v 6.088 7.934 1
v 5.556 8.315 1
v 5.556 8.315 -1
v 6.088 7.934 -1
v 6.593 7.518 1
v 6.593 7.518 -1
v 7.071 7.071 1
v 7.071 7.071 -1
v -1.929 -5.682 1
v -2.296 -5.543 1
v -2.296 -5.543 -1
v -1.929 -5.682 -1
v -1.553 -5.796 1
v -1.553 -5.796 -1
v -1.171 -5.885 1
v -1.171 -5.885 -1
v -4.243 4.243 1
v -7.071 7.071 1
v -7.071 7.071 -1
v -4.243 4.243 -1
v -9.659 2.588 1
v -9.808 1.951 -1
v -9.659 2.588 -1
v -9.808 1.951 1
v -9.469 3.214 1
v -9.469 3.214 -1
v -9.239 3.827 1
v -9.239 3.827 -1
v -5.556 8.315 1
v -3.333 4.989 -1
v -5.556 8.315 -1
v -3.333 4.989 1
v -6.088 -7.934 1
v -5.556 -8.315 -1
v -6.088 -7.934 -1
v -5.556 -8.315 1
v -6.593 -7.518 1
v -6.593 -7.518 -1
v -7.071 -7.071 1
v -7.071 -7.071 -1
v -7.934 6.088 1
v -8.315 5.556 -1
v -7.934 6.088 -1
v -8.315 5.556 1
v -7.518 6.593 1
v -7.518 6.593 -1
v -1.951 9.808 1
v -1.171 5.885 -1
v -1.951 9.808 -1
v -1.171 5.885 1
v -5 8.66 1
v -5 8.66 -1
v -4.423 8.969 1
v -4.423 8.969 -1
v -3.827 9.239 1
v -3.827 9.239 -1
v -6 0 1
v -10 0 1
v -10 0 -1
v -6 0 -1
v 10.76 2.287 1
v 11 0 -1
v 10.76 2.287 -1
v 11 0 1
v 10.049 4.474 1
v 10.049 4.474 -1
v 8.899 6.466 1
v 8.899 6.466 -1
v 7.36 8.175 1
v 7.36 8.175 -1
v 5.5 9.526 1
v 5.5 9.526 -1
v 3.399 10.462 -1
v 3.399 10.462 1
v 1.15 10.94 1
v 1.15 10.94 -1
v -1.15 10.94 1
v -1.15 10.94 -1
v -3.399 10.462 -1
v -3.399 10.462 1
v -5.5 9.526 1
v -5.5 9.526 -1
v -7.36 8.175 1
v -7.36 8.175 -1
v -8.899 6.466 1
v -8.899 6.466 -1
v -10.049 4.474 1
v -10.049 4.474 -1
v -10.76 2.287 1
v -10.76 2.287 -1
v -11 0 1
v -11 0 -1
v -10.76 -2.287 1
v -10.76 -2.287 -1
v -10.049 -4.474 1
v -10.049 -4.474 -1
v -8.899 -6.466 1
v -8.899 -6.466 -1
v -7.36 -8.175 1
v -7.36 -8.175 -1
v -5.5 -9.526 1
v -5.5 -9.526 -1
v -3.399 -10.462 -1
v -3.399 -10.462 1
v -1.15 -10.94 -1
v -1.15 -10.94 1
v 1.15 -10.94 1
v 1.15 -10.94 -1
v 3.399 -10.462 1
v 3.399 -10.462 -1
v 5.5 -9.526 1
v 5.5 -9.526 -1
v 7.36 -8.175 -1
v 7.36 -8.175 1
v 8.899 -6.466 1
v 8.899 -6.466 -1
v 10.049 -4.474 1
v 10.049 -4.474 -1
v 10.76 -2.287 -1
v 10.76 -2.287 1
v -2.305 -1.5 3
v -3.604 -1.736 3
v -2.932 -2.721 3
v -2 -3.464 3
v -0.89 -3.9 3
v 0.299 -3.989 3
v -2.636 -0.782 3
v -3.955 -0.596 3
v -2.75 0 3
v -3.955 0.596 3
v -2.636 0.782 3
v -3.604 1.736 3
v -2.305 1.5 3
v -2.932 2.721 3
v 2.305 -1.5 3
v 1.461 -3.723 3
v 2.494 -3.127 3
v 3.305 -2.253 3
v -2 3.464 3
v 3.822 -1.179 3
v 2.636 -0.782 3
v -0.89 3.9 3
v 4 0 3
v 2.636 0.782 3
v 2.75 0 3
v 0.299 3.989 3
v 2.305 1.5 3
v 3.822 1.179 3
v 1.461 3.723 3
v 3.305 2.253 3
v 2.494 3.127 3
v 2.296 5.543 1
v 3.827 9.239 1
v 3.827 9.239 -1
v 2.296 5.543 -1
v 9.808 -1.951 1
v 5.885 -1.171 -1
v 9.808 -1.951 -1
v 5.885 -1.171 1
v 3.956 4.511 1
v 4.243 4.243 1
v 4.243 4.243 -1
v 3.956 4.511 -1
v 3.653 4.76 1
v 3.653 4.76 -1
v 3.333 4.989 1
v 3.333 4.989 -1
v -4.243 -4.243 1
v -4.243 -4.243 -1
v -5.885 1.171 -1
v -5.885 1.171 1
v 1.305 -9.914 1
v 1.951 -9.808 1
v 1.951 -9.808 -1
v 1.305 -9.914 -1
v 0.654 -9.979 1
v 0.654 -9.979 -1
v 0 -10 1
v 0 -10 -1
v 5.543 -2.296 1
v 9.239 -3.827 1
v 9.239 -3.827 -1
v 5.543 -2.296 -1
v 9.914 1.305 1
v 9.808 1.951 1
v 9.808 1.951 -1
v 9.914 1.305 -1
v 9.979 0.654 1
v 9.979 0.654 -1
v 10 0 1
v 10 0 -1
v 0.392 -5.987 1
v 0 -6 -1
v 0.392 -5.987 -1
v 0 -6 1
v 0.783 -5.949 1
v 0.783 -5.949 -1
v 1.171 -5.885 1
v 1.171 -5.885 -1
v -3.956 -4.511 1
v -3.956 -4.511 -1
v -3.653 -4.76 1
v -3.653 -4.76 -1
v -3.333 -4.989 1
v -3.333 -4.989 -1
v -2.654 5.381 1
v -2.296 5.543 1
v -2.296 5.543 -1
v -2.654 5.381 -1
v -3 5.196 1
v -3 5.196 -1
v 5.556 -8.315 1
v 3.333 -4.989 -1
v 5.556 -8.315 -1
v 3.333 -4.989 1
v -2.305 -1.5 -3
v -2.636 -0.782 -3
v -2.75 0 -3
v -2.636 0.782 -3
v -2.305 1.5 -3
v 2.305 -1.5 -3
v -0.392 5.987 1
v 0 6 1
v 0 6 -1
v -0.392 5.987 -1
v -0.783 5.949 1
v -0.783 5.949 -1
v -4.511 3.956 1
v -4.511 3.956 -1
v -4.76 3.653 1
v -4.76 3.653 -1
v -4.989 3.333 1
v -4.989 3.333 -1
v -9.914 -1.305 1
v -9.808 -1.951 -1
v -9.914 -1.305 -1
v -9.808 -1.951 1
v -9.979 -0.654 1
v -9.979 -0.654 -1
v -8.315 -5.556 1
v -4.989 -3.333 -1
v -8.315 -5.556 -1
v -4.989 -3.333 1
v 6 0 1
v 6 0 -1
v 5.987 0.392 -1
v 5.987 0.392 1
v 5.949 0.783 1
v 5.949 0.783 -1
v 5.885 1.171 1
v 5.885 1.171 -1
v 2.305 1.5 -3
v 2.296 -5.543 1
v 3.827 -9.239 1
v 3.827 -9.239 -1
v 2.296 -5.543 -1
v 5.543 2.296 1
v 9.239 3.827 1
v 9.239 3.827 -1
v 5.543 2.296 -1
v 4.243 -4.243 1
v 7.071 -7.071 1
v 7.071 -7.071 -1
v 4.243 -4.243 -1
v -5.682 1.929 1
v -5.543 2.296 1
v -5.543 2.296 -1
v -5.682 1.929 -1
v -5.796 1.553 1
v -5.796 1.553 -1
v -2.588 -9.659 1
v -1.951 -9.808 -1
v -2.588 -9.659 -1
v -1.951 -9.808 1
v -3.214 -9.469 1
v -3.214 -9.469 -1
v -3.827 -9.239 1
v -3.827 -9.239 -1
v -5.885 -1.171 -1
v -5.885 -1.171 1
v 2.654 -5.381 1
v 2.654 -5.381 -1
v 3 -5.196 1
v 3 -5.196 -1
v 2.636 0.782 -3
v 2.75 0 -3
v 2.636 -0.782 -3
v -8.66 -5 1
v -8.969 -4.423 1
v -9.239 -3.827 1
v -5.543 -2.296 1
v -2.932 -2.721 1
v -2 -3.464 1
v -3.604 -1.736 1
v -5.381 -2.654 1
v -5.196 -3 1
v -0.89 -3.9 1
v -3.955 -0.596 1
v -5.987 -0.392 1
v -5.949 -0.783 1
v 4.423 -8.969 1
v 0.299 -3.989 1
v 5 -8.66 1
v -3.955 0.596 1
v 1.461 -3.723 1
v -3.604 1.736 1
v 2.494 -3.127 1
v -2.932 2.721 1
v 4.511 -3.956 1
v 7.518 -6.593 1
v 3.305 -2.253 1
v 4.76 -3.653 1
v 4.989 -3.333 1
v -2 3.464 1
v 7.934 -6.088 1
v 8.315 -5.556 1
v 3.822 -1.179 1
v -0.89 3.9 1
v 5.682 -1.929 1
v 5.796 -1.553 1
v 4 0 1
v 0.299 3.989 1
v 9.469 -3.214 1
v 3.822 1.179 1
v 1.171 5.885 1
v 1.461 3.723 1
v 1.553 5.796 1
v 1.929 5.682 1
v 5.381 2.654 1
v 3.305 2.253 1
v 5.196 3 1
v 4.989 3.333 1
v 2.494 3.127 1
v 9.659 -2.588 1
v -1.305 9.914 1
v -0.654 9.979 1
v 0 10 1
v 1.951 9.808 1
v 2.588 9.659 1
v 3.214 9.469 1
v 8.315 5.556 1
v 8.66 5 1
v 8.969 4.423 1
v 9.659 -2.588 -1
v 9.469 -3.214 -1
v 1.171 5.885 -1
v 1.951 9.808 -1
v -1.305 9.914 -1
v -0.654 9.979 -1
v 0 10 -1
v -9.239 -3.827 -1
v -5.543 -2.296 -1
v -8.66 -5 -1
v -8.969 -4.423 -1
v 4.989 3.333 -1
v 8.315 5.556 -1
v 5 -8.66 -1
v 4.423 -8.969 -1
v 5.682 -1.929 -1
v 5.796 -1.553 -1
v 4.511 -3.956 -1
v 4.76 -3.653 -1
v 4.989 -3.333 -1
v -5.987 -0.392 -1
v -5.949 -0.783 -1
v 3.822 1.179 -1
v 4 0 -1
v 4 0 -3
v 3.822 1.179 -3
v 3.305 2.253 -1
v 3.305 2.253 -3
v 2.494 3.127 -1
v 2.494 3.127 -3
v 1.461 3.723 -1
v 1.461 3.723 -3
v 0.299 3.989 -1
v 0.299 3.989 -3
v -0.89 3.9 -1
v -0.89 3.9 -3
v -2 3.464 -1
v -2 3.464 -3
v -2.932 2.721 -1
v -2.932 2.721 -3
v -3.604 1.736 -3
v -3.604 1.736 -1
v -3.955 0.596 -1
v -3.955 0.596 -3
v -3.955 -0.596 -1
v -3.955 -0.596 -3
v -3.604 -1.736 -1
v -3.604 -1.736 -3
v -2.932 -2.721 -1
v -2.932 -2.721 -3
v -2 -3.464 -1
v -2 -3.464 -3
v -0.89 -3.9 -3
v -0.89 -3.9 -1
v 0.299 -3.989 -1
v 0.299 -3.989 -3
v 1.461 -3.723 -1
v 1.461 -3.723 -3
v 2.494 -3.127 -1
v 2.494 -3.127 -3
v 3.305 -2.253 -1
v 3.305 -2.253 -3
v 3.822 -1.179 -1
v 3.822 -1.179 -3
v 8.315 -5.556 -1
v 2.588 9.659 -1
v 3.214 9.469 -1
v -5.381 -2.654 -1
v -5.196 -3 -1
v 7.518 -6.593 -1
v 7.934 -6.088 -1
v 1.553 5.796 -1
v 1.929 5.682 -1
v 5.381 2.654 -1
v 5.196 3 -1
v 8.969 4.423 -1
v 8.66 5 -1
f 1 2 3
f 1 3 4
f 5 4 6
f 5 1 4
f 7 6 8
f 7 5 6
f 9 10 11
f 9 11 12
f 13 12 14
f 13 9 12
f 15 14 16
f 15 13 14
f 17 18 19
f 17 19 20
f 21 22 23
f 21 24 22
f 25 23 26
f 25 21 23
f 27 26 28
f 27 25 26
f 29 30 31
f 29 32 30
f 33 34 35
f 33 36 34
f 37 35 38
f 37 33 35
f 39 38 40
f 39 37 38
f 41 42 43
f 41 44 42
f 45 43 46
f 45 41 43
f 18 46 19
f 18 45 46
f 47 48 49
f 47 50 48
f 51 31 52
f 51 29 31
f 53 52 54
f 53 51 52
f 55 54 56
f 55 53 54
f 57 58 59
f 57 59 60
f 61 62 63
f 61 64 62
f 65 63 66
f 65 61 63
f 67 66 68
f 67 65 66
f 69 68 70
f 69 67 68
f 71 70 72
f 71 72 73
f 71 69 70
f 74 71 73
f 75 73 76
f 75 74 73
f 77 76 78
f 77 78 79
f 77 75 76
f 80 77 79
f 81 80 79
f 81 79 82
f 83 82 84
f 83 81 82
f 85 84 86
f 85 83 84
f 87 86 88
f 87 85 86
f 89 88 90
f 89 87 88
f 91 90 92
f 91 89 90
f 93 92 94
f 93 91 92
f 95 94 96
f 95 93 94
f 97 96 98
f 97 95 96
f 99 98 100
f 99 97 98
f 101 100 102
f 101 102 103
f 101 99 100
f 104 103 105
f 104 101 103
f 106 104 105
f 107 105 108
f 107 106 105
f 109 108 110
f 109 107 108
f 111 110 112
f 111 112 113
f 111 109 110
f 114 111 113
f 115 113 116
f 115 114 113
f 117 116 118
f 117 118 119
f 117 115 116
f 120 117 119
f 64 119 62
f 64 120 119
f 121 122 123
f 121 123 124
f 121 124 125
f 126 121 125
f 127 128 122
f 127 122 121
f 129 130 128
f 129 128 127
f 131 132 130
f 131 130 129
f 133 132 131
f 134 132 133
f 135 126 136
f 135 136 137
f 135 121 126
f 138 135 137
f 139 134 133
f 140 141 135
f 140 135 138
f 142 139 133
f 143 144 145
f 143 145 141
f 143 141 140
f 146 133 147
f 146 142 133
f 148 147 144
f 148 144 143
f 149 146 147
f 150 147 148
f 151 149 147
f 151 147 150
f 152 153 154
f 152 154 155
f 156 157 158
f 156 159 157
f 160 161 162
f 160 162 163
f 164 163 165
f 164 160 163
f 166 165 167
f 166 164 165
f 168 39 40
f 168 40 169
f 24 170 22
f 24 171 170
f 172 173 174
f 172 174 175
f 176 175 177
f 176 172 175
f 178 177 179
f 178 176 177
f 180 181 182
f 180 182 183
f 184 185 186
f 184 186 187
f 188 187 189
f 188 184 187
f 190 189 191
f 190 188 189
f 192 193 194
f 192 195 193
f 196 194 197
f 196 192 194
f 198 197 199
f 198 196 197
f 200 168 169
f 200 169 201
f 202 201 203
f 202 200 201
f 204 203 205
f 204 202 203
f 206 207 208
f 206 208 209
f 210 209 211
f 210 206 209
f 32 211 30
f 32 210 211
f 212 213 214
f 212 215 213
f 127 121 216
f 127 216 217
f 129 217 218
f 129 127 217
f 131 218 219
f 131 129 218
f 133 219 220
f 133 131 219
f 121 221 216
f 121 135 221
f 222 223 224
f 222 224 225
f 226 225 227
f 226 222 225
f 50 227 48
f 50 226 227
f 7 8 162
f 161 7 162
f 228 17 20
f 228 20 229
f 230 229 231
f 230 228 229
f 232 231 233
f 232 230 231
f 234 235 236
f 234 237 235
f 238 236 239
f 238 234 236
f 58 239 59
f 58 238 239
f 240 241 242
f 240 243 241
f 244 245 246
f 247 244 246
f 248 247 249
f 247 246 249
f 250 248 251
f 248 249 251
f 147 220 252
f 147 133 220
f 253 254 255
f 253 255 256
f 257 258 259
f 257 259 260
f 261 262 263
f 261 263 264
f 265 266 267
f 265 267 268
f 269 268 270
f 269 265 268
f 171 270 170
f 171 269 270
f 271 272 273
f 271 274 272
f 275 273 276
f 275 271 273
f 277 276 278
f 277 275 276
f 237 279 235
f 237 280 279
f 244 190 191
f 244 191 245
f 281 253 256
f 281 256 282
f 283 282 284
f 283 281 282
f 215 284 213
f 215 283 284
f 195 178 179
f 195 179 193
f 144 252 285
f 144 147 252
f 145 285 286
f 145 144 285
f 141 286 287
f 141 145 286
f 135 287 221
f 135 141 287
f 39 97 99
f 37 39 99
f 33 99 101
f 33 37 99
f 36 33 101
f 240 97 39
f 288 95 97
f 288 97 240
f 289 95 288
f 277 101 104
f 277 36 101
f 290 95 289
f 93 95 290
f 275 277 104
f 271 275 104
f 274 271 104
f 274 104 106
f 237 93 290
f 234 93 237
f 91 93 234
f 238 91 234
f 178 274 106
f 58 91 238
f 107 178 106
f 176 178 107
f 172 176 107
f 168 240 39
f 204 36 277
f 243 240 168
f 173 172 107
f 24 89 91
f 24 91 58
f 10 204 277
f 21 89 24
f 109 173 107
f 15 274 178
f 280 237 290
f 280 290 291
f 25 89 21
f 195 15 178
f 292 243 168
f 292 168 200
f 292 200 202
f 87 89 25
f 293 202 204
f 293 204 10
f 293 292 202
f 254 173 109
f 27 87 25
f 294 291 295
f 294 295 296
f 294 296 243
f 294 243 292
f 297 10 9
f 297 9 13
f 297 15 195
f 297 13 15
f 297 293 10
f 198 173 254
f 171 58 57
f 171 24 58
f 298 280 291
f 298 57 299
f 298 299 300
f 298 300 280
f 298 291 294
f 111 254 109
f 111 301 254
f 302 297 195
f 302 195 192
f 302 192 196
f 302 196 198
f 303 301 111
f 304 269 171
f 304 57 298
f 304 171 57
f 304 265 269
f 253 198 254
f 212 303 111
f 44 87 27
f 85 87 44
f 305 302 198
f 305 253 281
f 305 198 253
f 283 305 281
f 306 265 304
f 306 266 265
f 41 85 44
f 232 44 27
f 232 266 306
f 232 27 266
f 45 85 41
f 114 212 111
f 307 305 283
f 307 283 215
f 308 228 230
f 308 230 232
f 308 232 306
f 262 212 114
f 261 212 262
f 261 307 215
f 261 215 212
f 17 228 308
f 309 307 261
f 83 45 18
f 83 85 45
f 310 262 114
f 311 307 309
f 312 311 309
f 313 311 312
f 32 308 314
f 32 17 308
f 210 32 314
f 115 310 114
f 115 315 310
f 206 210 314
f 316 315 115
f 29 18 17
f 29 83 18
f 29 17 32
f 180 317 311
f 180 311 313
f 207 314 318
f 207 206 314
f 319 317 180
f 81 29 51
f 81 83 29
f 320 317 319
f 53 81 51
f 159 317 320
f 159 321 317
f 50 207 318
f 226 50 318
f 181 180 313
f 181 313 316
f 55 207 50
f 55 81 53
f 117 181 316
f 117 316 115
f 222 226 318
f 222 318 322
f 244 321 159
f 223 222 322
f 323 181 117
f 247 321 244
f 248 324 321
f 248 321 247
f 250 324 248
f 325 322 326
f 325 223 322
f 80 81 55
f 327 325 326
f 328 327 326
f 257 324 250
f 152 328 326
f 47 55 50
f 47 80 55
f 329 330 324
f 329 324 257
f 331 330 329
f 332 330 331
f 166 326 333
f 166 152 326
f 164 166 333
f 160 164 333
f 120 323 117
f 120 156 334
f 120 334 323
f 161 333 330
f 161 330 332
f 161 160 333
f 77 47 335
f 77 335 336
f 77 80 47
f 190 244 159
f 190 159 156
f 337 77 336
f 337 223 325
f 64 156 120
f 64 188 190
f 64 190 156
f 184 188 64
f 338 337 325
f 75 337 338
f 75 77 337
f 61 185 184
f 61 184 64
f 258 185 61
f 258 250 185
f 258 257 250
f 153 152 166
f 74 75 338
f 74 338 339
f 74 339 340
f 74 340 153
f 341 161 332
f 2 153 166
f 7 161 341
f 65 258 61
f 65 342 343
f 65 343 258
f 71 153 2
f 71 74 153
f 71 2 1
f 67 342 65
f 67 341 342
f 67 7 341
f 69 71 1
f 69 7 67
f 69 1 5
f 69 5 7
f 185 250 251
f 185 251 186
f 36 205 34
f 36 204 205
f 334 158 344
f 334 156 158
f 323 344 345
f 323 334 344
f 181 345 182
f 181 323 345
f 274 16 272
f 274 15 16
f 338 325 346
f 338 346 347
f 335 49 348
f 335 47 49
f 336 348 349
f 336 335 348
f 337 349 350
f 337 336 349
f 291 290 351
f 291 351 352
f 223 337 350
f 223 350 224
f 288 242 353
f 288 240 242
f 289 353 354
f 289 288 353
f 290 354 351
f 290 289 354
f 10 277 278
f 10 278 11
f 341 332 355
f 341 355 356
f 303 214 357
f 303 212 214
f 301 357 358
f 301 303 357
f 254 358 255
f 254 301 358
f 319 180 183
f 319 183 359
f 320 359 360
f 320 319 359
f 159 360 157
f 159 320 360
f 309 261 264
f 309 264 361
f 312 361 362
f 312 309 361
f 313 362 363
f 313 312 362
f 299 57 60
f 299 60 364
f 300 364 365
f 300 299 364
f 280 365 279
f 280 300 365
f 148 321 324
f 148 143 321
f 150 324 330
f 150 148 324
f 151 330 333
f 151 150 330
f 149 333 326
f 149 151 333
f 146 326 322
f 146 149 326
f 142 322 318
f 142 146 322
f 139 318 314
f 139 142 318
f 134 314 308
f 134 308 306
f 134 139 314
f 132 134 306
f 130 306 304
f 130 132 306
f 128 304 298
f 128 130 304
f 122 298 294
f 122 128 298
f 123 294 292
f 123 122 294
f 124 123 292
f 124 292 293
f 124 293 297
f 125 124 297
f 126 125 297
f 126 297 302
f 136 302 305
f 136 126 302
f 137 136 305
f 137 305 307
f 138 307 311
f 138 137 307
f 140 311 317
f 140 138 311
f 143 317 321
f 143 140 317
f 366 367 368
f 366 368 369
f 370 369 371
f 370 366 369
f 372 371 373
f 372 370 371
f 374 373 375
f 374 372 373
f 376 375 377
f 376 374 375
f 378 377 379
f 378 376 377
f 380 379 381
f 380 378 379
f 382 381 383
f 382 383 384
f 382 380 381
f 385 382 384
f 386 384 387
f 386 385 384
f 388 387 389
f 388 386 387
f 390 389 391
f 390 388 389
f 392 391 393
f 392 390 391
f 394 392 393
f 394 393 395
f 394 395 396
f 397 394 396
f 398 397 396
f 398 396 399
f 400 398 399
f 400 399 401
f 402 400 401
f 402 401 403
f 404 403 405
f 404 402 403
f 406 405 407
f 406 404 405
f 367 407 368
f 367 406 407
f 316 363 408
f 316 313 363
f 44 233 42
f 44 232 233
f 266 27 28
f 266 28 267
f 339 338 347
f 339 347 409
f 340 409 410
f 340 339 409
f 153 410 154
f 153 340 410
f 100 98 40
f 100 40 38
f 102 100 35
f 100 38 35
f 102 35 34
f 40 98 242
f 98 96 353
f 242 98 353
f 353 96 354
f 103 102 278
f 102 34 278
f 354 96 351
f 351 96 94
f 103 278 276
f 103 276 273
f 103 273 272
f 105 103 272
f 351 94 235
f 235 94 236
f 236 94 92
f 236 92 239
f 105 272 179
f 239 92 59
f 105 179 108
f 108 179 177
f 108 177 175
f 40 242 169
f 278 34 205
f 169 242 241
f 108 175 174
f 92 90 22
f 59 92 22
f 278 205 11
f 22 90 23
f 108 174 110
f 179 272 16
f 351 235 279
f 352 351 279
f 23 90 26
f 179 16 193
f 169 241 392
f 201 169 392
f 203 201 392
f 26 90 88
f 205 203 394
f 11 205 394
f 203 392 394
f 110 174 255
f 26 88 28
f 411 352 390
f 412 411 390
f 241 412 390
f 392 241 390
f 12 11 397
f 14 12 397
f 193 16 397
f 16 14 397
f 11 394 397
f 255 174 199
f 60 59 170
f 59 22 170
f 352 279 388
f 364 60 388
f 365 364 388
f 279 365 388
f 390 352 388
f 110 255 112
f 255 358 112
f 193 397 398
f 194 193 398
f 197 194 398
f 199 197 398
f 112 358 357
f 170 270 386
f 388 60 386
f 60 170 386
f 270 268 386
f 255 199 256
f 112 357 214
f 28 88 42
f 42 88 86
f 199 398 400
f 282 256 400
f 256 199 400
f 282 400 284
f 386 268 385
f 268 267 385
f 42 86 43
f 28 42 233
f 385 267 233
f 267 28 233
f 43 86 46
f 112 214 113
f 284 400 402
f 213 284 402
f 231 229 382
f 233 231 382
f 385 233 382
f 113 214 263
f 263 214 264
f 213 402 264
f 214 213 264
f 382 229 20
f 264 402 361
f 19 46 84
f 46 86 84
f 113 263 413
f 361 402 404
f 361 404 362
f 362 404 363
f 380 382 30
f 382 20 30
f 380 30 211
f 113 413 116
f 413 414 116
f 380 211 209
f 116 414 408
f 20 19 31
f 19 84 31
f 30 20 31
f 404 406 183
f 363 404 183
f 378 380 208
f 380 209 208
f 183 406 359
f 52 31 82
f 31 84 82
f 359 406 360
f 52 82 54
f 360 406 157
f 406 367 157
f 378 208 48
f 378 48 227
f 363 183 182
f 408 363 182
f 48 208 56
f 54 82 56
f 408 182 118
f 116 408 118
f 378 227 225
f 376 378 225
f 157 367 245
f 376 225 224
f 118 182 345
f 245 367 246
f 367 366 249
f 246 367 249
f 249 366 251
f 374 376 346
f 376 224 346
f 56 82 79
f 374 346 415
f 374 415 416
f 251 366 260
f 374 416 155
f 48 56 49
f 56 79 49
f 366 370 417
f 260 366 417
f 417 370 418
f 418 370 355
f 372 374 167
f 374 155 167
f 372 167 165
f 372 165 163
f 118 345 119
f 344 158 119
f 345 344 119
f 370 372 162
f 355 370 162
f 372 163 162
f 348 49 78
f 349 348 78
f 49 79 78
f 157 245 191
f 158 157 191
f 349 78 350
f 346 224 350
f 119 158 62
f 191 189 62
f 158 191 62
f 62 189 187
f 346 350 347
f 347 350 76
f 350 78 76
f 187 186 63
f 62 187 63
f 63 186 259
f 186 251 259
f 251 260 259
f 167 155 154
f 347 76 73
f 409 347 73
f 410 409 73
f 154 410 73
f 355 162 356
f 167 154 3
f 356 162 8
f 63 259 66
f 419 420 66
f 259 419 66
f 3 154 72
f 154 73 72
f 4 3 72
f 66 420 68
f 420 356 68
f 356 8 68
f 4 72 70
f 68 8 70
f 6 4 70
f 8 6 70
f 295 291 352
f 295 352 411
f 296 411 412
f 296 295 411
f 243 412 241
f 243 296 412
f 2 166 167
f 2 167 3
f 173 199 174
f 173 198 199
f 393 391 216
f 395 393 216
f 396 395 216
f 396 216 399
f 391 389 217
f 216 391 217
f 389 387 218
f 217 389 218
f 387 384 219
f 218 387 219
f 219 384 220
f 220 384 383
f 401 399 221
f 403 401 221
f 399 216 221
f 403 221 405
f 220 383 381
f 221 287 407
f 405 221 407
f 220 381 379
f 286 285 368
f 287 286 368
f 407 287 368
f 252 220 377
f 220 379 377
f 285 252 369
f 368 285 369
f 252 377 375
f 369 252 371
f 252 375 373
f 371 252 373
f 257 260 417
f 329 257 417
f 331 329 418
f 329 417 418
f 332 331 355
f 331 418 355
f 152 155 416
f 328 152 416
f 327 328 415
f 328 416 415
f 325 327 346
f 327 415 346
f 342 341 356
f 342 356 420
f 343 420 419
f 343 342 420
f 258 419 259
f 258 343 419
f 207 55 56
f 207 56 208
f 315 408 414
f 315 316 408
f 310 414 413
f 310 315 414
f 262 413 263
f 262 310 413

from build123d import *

# Parameters (mm, degrees)
F0_R     = 4
F1_DEPTH = 3
F0_R_2   = 11
F2_DEPTH = 1


with BuildPart() as f1:
    # F0 (on Top) → F1 (new body, symmetric)
    with BuildSketch(Plane.XY):
        Circle(F0_R)
        with BuildLine():
            ThreePointArc((-2.304886, -1.5), (-2.75, 0), (-2.304886, 1.5))
            Line((-2.304886, 1.5), (2.304886, 1.5))
            ThreePointArc((2.304886, 1.5), (2.75, 0), (2.304886, -1.5))
            Line((2.304886, -1.5), (-2.304886, -1.5))
        make_face(mode=Mode.SUBTRACT)
    extrude(amount=F1_DEPTH, both=True)

    # F0 (on Top) → F2 (join, symmetric)
    with BuildSketch(Plane.XY):
        Circle(F0_R_2)
        with BuildLine():
            Line((-7.071068, -7.071068), (-4.242641, -4.242641))
            ThreePointArc((-4.242641, -4.242641), (-3.80636, -4.638063), (-3.333421, -4.988818))
            Line((-3.333421, -4.988818), (-5.555702, -8.314696))
            ThreePointArc((-5.555702, -8.314696), (-6.343933, -7.730105), (-7.071068, -7.071068))
        make_face(mode=Mode.SUBTRACT)
        with BuildLine():
            Line((-3.826834, -9.238795), (-2.296101, -5.543277))
            ThreePointArc((-2.296101, -5.543277), (-1.741708, -5.741642), (-1.170542, -5.884712))
            Line((-1.170542, -5.884712), (-1.950903, -9.807853))
            ThreePointArc((-1.950903, -9.807853), (-2.902847, -9.569403), (-3.826834, -9.238795))
        make_face(mode=Mode.SUBTRACT)
        with BuildLine():
            Line((-9.238795, -3.826834), (-5.543277, -2.296101))
            ThreePointArc((-5.543277, -2.296101), (-5.291528, -2.82838), (-4.988818, -3.333421))
            Line((-4.988818, -3.333421), (-8.314696, -5.555702))
            ThreePointArc((-8.314696, -5.555702), (-8.819213, -4.713967), (-9.238795, -3.826834))
        make_face(mode=Mode.SUBTRACT)
        with BuildLine():
            Line((-10, 0), (-6, 0))
            ThreePointArc((-6, 0), (-5.971108, -0.588103), (-5.884712, -1.170542))
            Line((-5.884712, -1.170542), (-9.807853, -1.950903))
            ThreePointArc((-9.807853, -1.950903), (-9.951847, -0.980171), (-10, 0))
        make_face(mode=Mode.SUBTRACT)
        with BuildLine():
            ThreePointArc((1.950903, -9.807853), (0.980171, -9.951847), (0, -10))
            Line((0, -10), (0, -6))
            ThreePointArc((0, -6), (0.588103, -5.971108), (1.170542, -5.884712))
            Line((1.170542, -5.884712), (1.950903, -9.807853))
        make_face(mode=Mode.SUBTRACT)
        with BuildLine():
            Line((3.826834, -9.238795), (2.296101, -5.543277))
            ThreePointArc((2.296101, -5.543277), (2.82838, -5.291528), (3.333421, -4.988818))
            Line((3.333421, -4.988818), (5.555702, -8.314696))
            ThreePointArc((5.555702, -8.314696), (4.713967, -8.819213), (3.826834, -9.238795))
        make_face(mode=Mode.SUBTRACT)
        with BuildLine():
            Line((7.071068, -7.071068), (4.242641, -4.242641))
            ThreePointArc((4.242641, -4.242641), (4.638063, -3.80636), (4.988818, -3.333421))
            Line((4.988818, -3.333421), (8.314696, -5.555702))
            ThreePointArc((8.314696, -5.555702), (7.730105, -6.343933), (7.071068, -7.071068))
        make_face(mode=Mode.SUBTRACT)
        with BuildLine():
            Line((9.238795, -3.826834), (5.543277, -2.296101))
            ThreePointArc((5.543277, -2.296101), (5.741642, -1.741708), (5.884712, -1.170542))
            Line((5.884712, -1.170542), (9.807853, -1.950903))
            ThreePointArc((9.807853, -1.950903), (9.569403, -2.902847), (9.238795, -3.826834))
        make_face(mode=Mode.SUBTRACT)
        with BuildLine():
            Line((-9.238795, 3.826834), (-5.543277, 2.296101))
            ThreePointArc((-5.543277, 2.296101), (-5.741642, 1.741708), (-5.884712, 1.170542))
            Line((-5.884712, 1.170542), (-9.807853, 1.950903))
            ThreePointArc((-9.807853, 1.950903), (-9.569403, 2.902847), (-9.238795, 3.826834))
        make_face(mode=Mode.SUBTRACT)
        with BuildLine():
            Line((-7.071068, 7.071068), (-4.242641, 4.242641))
            ThreePointArc((-4.242641, 4.242641), (-4.638063, 3.80636), (-4.988818, 3.333421))
            Line((-4.988818, 3.333421), (-8.314696, 5.555702))
            ThreePointArc((-8.314696, 5.555702), (-7.730105, 6.343933), (-7.071068, 7.071068))
        make_face(mode=Mode.SUBTRACT)
        with BuildLine():
            Line((-3.826834, 9.238795), (-2.296101, 5.543277))
            ThreePointArc((-2.296101, 5.543277), (-2.82838, 5.291528), (-3.333421, 4.988818))
            Line((-3.333421, 4.988818), (-5.555702, 8.314696))
            ThreePointArc((-5.555702, 8.314696), (-4.713967, 8.819213), (-3.826834, 9.238795))
        make_face(mode=Mode.SUBTRACT)
        with BuildLine():
            Line((0, 10), (0, 6))
            ThreePointArc((0, 6), (-0.588103, 5.971108), (-1.170542, 5.884712))
            Line((-1.170542, 5.884712), (-1.950903, 9.807853))
            ThreePointArc((-1.950903, 9.807853), (-0.980171, 9.951847), (0, 10))
        make_face(mode=Mode.SUBTRACT)
        Circle(F0_R, mode=Mode.SUBTRACT)
        with BuildLine():
            Line((10, 0), (6, 0))
            ThreePointArc((6, 0), (5.971108, 0.588103), (5.884712, 1.170542))
            Line((5.884712, 1.170542), (9.807853, 1.950903))
            ThreePointArc((9.807853, 1.950903), (9.951847, 0.980171), (10, 0))
        make_face(mode=Mode.SUBTRACT)
        with BuildLine():
            Line((9.238795, 3.826834), (5.543277, 2.296101))
            ThreePointArc((5.543277, 2.296101), (5.291528, 2.82838), (4.988818, 3.333421))
            Line((4.988818, 3.333421), (8.314696, 5.555702))
            ThreePointArc((8.314696, 5.555702), (8.819213, 4.713967), (9.238795, 3.826834))
        make_face(mode=Mode.SUBTRACT)
        with BuildLine():
            Line((3.826834, 9.238795), (2.296101, 5.543277))
            ThreePointArc((2.296101, 5.543277), (1.741708, 5.741642), (1.170542, 5.884712))
            Line((1.170542, 5.884712), (1.950903, 9.807853))
            ThreePointArc((1.950903, 9.807853), (2.902847, 9.569403), (3.826834, 9.238795))
        make_face(mode=Mode.SUBTRACT)
        with BuildLine():
            Line((7.071068, 7.071068), (4.242641, 4.242641))
            ThreePointArc((4.242641, 4.242641), (3.80636, 4.638063), (3.333421, 4.988818))
            Line((3.333421, 4.988818), (5.555702, 8.314696))
            ThreePointArc((5.555702, 8.314696), (6.343933, 7.730105), (7.071068, 7.071068))
        make_face(mode=Mode.SUBTRACT)
    extrude(amount=F2_DEPTH, both=True)


solid = f1.part
